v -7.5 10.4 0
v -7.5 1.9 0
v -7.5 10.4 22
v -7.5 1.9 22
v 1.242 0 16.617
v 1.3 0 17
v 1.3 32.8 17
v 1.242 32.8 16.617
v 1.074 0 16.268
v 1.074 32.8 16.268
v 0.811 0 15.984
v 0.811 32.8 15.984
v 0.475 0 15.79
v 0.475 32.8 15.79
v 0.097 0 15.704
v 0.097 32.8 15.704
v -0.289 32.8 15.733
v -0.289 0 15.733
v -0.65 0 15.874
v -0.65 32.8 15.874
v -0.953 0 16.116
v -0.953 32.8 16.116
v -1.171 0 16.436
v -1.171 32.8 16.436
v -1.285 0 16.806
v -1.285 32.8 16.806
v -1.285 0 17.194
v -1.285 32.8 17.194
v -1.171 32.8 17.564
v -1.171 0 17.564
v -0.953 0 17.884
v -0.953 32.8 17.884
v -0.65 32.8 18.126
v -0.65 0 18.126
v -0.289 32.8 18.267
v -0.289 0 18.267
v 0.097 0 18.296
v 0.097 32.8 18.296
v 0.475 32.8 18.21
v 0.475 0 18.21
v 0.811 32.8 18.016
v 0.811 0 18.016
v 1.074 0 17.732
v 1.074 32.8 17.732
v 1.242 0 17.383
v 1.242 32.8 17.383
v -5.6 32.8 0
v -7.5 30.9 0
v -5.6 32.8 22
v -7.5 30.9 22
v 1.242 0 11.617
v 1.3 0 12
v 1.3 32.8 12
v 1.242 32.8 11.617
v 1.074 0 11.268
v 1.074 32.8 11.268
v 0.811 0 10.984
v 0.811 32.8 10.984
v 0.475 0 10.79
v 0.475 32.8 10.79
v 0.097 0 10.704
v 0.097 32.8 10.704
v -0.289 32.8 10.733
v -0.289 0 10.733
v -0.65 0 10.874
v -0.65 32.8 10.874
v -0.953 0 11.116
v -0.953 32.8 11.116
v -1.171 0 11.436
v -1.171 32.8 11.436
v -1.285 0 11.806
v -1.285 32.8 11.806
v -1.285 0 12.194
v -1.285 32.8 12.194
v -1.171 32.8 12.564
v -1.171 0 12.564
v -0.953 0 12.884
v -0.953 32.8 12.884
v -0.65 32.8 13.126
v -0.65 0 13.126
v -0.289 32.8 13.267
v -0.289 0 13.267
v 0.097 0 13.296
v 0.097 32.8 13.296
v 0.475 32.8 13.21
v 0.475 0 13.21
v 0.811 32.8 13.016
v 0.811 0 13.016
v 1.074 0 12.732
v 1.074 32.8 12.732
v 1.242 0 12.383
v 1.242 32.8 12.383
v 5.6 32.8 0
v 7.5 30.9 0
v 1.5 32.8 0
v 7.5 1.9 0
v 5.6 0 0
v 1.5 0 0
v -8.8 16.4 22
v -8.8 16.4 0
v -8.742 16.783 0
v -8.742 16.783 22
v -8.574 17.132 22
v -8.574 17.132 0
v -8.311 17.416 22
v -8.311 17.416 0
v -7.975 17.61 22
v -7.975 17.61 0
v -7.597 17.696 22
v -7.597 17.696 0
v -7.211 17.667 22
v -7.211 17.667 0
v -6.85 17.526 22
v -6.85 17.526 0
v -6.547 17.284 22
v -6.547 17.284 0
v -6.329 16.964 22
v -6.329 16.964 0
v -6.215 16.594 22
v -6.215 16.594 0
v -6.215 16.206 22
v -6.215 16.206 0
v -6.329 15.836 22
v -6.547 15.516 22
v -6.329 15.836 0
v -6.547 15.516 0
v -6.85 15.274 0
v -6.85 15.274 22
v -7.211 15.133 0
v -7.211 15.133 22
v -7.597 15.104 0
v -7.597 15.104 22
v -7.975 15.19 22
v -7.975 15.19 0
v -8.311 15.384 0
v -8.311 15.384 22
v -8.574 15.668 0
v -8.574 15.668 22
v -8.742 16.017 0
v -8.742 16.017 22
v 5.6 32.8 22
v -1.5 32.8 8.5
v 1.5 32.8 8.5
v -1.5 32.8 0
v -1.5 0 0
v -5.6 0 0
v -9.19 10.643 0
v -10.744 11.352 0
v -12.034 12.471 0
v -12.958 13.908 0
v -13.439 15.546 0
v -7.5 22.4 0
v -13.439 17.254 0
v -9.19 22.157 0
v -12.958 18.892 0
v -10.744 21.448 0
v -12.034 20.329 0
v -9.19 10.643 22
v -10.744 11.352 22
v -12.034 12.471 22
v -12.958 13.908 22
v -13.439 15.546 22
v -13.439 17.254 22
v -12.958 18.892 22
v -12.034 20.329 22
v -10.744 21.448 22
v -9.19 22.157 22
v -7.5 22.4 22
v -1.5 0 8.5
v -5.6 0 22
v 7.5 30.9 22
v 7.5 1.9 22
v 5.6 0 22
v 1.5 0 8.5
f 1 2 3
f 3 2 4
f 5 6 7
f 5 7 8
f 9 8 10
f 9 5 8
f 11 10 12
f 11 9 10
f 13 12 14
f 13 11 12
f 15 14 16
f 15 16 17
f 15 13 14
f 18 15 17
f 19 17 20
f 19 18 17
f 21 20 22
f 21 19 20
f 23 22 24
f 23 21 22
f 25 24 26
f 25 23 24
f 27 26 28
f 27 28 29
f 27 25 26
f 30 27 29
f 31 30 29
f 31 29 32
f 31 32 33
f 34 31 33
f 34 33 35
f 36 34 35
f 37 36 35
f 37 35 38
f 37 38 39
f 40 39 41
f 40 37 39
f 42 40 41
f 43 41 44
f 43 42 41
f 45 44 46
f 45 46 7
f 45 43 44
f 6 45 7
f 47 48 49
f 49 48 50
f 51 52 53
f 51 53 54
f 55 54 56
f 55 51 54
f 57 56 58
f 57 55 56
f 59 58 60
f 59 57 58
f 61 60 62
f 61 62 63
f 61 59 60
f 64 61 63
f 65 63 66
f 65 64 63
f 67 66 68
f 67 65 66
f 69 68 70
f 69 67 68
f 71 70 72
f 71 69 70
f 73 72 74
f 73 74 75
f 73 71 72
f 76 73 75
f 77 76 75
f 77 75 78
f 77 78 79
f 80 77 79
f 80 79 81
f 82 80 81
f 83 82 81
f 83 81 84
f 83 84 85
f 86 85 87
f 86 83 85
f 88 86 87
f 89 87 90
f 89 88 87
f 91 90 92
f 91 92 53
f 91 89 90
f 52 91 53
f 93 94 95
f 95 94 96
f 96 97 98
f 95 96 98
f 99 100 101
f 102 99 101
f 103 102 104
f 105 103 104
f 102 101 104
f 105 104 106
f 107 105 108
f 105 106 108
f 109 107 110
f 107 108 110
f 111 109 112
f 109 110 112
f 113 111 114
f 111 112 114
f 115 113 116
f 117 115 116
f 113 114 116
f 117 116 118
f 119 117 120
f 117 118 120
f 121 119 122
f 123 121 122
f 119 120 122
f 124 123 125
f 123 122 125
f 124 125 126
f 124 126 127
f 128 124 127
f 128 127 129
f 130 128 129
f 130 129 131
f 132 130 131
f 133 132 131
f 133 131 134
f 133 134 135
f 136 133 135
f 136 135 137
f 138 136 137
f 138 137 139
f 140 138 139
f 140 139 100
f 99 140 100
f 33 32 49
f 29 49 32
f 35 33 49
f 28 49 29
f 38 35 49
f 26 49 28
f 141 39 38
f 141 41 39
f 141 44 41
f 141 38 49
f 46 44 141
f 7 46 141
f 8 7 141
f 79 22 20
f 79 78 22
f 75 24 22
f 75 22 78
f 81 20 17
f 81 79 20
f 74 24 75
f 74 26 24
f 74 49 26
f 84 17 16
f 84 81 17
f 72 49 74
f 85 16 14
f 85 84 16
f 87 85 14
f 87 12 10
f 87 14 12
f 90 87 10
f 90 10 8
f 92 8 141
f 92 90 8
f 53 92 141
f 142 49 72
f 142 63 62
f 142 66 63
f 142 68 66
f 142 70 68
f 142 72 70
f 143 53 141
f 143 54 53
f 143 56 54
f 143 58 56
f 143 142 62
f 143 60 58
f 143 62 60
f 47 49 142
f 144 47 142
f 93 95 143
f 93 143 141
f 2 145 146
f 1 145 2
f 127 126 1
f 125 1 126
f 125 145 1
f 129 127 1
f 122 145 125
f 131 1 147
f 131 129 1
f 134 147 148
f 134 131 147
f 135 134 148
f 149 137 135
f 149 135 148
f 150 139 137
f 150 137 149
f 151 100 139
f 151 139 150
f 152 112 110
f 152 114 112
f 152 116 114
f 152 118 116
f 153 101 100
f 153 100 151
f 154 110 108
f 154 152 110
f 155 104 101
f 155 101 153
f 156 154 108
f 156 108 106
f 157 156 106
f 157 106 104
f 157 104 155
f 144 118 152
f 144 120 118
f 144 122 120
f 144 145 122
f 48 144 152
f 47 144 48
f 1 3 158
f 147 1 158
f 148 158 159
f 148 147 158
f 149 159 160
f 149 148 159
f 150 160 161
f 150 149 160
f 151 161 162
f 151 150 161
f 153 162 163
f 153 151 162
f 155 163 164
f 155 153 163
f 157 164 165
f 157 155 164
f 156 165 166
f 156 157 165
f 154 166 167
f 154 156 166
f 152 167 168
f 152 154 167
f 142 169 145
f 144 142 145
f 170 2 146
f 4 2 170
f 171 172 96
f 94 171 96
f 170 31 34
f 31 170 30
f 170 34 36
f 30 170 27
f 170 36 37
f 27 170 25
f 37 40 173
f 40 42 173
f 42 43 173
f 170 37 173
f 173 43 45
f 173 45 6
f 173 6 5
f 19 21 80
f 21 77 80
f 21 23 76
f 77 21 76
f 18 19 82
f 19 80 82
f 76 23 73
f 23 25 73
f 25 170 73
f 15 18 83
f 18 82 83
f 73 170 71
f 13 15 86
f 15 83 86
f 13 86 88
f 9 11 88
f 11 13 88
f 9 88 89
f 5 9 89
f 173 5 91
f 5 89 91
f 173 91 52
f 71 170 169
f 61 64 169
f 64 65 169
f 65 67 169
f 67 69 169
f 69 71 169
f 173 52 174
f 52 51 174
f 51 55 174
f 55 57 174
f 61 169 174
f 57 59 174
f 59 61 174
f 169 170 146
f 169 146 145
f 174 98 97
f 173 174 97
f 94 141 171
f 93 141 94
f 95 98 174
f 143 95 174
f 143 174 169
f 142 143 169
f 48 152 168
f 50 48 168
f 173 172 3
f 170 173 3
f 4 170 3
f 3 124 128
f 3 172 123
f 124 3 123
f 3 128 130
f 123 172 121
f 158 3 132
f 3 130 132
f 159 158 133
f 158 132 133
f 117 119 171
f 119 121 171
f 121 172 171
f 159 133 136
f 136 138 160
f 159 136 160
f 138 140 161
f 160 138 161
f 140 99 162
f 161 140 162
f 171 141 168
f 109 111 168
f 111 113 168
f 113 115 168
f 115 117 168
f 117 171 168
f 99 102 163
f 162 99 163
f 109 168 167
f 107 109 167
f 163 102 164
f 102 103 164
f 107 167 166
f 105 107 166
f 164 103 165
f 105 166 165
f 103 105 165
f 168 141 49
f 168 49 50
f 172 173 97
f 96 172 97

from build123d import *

# Parameters (mm, degrees)
SKETCH1_R               = 1.3
BOSS_EXTRUDE1_DEPTH     = 32.8
CHAMFER1_SIZE           = 1.9
CHAMFER2_SIZE           = 1.9
SKETCH2_R               = 6
BOSS_EXTRUDE2_DEPTH     = 22
SKETCH3_R               = 1.3
CUT_EXTRUDE1_DEPTH      = 1
CUT_EXTRUDE1_DEPTH_BACK = 23


with BuildPart() as part:
    # Sketch1 → Boss-Extrude1 (new body)
    with BuildSketch(Plane(origin=(0, 0, 0), x_dir=(1, 0, 0), z_dir=(0, 1, 0))):
        Polygon((-1.5, 0), (-7.5, 0), (-7.5, -22), (7.5, -22), (7.5, 0), (1.5, 0), (1.5, -8.5), (-1.5, -8.5), align=None)
        with Locations((0, -17)):
            Circle(SKETCH1_R, mode=Mode.SUBTRACT)
        with Locations((0, -12)):
            Circle(SKETCH1_R, mode=Mode.SUBTRACT)
    extrude(amount=BOSS_EXTRUDE1_DEPTH)

    # Chamfer1
    chamfer1_edges = [part.edges().sort_by_distance(p)[0] for p in [
        (7.5, 0, 11),
        (7.5, 32.8, 11),
    ]]
    chamfer(chamfer1_edges, length=CHAMFER1_SIZE)

    # Chamfer2
    chamfer2_edges = [part.edges().sort_by_distance(p)[0] for p in [
        (-7.5, 0, 11),
        (-7.5, 32.8, 11),
    ]]
    chamfer(chamfer2_edges, length=CHAMFER2_SIZE)

    # Sketch2 → Boss-Extrude2 (add)
    with BuildSketch(Plane(origin=(0, 0, 0), x_dir=(-1, 0, 0), z_dir=(0, 0, -1))):
        with Locations((7.5, 16.4)):
            Circle(SKETCH2_R)
    extrude(amount=-BOSS_EXTRUDE2_DEPTH)

    # Sketch3 → Cut-Extrude1 (cut, two sides)
    with BuildSketch(Plane(origin=(0, 0, 0), x_dir=(-1, 0, 0), z_dir=(0, 0, -1))) as cut_extrude1_sk:
        with Locations((7.5, 16.4)):
            Circle(SKETCH3_R)
    extrude(amount=CUT_EXTRUDE1_DEPTH, mode=Mode.SUBTRACT)
    extrude(cut_extrude1_sk.sketch, amount=-CUT_EXTRUDE1_DEPTH_BACK, mode=Mode.SUBTRACT)


solid = part.part
